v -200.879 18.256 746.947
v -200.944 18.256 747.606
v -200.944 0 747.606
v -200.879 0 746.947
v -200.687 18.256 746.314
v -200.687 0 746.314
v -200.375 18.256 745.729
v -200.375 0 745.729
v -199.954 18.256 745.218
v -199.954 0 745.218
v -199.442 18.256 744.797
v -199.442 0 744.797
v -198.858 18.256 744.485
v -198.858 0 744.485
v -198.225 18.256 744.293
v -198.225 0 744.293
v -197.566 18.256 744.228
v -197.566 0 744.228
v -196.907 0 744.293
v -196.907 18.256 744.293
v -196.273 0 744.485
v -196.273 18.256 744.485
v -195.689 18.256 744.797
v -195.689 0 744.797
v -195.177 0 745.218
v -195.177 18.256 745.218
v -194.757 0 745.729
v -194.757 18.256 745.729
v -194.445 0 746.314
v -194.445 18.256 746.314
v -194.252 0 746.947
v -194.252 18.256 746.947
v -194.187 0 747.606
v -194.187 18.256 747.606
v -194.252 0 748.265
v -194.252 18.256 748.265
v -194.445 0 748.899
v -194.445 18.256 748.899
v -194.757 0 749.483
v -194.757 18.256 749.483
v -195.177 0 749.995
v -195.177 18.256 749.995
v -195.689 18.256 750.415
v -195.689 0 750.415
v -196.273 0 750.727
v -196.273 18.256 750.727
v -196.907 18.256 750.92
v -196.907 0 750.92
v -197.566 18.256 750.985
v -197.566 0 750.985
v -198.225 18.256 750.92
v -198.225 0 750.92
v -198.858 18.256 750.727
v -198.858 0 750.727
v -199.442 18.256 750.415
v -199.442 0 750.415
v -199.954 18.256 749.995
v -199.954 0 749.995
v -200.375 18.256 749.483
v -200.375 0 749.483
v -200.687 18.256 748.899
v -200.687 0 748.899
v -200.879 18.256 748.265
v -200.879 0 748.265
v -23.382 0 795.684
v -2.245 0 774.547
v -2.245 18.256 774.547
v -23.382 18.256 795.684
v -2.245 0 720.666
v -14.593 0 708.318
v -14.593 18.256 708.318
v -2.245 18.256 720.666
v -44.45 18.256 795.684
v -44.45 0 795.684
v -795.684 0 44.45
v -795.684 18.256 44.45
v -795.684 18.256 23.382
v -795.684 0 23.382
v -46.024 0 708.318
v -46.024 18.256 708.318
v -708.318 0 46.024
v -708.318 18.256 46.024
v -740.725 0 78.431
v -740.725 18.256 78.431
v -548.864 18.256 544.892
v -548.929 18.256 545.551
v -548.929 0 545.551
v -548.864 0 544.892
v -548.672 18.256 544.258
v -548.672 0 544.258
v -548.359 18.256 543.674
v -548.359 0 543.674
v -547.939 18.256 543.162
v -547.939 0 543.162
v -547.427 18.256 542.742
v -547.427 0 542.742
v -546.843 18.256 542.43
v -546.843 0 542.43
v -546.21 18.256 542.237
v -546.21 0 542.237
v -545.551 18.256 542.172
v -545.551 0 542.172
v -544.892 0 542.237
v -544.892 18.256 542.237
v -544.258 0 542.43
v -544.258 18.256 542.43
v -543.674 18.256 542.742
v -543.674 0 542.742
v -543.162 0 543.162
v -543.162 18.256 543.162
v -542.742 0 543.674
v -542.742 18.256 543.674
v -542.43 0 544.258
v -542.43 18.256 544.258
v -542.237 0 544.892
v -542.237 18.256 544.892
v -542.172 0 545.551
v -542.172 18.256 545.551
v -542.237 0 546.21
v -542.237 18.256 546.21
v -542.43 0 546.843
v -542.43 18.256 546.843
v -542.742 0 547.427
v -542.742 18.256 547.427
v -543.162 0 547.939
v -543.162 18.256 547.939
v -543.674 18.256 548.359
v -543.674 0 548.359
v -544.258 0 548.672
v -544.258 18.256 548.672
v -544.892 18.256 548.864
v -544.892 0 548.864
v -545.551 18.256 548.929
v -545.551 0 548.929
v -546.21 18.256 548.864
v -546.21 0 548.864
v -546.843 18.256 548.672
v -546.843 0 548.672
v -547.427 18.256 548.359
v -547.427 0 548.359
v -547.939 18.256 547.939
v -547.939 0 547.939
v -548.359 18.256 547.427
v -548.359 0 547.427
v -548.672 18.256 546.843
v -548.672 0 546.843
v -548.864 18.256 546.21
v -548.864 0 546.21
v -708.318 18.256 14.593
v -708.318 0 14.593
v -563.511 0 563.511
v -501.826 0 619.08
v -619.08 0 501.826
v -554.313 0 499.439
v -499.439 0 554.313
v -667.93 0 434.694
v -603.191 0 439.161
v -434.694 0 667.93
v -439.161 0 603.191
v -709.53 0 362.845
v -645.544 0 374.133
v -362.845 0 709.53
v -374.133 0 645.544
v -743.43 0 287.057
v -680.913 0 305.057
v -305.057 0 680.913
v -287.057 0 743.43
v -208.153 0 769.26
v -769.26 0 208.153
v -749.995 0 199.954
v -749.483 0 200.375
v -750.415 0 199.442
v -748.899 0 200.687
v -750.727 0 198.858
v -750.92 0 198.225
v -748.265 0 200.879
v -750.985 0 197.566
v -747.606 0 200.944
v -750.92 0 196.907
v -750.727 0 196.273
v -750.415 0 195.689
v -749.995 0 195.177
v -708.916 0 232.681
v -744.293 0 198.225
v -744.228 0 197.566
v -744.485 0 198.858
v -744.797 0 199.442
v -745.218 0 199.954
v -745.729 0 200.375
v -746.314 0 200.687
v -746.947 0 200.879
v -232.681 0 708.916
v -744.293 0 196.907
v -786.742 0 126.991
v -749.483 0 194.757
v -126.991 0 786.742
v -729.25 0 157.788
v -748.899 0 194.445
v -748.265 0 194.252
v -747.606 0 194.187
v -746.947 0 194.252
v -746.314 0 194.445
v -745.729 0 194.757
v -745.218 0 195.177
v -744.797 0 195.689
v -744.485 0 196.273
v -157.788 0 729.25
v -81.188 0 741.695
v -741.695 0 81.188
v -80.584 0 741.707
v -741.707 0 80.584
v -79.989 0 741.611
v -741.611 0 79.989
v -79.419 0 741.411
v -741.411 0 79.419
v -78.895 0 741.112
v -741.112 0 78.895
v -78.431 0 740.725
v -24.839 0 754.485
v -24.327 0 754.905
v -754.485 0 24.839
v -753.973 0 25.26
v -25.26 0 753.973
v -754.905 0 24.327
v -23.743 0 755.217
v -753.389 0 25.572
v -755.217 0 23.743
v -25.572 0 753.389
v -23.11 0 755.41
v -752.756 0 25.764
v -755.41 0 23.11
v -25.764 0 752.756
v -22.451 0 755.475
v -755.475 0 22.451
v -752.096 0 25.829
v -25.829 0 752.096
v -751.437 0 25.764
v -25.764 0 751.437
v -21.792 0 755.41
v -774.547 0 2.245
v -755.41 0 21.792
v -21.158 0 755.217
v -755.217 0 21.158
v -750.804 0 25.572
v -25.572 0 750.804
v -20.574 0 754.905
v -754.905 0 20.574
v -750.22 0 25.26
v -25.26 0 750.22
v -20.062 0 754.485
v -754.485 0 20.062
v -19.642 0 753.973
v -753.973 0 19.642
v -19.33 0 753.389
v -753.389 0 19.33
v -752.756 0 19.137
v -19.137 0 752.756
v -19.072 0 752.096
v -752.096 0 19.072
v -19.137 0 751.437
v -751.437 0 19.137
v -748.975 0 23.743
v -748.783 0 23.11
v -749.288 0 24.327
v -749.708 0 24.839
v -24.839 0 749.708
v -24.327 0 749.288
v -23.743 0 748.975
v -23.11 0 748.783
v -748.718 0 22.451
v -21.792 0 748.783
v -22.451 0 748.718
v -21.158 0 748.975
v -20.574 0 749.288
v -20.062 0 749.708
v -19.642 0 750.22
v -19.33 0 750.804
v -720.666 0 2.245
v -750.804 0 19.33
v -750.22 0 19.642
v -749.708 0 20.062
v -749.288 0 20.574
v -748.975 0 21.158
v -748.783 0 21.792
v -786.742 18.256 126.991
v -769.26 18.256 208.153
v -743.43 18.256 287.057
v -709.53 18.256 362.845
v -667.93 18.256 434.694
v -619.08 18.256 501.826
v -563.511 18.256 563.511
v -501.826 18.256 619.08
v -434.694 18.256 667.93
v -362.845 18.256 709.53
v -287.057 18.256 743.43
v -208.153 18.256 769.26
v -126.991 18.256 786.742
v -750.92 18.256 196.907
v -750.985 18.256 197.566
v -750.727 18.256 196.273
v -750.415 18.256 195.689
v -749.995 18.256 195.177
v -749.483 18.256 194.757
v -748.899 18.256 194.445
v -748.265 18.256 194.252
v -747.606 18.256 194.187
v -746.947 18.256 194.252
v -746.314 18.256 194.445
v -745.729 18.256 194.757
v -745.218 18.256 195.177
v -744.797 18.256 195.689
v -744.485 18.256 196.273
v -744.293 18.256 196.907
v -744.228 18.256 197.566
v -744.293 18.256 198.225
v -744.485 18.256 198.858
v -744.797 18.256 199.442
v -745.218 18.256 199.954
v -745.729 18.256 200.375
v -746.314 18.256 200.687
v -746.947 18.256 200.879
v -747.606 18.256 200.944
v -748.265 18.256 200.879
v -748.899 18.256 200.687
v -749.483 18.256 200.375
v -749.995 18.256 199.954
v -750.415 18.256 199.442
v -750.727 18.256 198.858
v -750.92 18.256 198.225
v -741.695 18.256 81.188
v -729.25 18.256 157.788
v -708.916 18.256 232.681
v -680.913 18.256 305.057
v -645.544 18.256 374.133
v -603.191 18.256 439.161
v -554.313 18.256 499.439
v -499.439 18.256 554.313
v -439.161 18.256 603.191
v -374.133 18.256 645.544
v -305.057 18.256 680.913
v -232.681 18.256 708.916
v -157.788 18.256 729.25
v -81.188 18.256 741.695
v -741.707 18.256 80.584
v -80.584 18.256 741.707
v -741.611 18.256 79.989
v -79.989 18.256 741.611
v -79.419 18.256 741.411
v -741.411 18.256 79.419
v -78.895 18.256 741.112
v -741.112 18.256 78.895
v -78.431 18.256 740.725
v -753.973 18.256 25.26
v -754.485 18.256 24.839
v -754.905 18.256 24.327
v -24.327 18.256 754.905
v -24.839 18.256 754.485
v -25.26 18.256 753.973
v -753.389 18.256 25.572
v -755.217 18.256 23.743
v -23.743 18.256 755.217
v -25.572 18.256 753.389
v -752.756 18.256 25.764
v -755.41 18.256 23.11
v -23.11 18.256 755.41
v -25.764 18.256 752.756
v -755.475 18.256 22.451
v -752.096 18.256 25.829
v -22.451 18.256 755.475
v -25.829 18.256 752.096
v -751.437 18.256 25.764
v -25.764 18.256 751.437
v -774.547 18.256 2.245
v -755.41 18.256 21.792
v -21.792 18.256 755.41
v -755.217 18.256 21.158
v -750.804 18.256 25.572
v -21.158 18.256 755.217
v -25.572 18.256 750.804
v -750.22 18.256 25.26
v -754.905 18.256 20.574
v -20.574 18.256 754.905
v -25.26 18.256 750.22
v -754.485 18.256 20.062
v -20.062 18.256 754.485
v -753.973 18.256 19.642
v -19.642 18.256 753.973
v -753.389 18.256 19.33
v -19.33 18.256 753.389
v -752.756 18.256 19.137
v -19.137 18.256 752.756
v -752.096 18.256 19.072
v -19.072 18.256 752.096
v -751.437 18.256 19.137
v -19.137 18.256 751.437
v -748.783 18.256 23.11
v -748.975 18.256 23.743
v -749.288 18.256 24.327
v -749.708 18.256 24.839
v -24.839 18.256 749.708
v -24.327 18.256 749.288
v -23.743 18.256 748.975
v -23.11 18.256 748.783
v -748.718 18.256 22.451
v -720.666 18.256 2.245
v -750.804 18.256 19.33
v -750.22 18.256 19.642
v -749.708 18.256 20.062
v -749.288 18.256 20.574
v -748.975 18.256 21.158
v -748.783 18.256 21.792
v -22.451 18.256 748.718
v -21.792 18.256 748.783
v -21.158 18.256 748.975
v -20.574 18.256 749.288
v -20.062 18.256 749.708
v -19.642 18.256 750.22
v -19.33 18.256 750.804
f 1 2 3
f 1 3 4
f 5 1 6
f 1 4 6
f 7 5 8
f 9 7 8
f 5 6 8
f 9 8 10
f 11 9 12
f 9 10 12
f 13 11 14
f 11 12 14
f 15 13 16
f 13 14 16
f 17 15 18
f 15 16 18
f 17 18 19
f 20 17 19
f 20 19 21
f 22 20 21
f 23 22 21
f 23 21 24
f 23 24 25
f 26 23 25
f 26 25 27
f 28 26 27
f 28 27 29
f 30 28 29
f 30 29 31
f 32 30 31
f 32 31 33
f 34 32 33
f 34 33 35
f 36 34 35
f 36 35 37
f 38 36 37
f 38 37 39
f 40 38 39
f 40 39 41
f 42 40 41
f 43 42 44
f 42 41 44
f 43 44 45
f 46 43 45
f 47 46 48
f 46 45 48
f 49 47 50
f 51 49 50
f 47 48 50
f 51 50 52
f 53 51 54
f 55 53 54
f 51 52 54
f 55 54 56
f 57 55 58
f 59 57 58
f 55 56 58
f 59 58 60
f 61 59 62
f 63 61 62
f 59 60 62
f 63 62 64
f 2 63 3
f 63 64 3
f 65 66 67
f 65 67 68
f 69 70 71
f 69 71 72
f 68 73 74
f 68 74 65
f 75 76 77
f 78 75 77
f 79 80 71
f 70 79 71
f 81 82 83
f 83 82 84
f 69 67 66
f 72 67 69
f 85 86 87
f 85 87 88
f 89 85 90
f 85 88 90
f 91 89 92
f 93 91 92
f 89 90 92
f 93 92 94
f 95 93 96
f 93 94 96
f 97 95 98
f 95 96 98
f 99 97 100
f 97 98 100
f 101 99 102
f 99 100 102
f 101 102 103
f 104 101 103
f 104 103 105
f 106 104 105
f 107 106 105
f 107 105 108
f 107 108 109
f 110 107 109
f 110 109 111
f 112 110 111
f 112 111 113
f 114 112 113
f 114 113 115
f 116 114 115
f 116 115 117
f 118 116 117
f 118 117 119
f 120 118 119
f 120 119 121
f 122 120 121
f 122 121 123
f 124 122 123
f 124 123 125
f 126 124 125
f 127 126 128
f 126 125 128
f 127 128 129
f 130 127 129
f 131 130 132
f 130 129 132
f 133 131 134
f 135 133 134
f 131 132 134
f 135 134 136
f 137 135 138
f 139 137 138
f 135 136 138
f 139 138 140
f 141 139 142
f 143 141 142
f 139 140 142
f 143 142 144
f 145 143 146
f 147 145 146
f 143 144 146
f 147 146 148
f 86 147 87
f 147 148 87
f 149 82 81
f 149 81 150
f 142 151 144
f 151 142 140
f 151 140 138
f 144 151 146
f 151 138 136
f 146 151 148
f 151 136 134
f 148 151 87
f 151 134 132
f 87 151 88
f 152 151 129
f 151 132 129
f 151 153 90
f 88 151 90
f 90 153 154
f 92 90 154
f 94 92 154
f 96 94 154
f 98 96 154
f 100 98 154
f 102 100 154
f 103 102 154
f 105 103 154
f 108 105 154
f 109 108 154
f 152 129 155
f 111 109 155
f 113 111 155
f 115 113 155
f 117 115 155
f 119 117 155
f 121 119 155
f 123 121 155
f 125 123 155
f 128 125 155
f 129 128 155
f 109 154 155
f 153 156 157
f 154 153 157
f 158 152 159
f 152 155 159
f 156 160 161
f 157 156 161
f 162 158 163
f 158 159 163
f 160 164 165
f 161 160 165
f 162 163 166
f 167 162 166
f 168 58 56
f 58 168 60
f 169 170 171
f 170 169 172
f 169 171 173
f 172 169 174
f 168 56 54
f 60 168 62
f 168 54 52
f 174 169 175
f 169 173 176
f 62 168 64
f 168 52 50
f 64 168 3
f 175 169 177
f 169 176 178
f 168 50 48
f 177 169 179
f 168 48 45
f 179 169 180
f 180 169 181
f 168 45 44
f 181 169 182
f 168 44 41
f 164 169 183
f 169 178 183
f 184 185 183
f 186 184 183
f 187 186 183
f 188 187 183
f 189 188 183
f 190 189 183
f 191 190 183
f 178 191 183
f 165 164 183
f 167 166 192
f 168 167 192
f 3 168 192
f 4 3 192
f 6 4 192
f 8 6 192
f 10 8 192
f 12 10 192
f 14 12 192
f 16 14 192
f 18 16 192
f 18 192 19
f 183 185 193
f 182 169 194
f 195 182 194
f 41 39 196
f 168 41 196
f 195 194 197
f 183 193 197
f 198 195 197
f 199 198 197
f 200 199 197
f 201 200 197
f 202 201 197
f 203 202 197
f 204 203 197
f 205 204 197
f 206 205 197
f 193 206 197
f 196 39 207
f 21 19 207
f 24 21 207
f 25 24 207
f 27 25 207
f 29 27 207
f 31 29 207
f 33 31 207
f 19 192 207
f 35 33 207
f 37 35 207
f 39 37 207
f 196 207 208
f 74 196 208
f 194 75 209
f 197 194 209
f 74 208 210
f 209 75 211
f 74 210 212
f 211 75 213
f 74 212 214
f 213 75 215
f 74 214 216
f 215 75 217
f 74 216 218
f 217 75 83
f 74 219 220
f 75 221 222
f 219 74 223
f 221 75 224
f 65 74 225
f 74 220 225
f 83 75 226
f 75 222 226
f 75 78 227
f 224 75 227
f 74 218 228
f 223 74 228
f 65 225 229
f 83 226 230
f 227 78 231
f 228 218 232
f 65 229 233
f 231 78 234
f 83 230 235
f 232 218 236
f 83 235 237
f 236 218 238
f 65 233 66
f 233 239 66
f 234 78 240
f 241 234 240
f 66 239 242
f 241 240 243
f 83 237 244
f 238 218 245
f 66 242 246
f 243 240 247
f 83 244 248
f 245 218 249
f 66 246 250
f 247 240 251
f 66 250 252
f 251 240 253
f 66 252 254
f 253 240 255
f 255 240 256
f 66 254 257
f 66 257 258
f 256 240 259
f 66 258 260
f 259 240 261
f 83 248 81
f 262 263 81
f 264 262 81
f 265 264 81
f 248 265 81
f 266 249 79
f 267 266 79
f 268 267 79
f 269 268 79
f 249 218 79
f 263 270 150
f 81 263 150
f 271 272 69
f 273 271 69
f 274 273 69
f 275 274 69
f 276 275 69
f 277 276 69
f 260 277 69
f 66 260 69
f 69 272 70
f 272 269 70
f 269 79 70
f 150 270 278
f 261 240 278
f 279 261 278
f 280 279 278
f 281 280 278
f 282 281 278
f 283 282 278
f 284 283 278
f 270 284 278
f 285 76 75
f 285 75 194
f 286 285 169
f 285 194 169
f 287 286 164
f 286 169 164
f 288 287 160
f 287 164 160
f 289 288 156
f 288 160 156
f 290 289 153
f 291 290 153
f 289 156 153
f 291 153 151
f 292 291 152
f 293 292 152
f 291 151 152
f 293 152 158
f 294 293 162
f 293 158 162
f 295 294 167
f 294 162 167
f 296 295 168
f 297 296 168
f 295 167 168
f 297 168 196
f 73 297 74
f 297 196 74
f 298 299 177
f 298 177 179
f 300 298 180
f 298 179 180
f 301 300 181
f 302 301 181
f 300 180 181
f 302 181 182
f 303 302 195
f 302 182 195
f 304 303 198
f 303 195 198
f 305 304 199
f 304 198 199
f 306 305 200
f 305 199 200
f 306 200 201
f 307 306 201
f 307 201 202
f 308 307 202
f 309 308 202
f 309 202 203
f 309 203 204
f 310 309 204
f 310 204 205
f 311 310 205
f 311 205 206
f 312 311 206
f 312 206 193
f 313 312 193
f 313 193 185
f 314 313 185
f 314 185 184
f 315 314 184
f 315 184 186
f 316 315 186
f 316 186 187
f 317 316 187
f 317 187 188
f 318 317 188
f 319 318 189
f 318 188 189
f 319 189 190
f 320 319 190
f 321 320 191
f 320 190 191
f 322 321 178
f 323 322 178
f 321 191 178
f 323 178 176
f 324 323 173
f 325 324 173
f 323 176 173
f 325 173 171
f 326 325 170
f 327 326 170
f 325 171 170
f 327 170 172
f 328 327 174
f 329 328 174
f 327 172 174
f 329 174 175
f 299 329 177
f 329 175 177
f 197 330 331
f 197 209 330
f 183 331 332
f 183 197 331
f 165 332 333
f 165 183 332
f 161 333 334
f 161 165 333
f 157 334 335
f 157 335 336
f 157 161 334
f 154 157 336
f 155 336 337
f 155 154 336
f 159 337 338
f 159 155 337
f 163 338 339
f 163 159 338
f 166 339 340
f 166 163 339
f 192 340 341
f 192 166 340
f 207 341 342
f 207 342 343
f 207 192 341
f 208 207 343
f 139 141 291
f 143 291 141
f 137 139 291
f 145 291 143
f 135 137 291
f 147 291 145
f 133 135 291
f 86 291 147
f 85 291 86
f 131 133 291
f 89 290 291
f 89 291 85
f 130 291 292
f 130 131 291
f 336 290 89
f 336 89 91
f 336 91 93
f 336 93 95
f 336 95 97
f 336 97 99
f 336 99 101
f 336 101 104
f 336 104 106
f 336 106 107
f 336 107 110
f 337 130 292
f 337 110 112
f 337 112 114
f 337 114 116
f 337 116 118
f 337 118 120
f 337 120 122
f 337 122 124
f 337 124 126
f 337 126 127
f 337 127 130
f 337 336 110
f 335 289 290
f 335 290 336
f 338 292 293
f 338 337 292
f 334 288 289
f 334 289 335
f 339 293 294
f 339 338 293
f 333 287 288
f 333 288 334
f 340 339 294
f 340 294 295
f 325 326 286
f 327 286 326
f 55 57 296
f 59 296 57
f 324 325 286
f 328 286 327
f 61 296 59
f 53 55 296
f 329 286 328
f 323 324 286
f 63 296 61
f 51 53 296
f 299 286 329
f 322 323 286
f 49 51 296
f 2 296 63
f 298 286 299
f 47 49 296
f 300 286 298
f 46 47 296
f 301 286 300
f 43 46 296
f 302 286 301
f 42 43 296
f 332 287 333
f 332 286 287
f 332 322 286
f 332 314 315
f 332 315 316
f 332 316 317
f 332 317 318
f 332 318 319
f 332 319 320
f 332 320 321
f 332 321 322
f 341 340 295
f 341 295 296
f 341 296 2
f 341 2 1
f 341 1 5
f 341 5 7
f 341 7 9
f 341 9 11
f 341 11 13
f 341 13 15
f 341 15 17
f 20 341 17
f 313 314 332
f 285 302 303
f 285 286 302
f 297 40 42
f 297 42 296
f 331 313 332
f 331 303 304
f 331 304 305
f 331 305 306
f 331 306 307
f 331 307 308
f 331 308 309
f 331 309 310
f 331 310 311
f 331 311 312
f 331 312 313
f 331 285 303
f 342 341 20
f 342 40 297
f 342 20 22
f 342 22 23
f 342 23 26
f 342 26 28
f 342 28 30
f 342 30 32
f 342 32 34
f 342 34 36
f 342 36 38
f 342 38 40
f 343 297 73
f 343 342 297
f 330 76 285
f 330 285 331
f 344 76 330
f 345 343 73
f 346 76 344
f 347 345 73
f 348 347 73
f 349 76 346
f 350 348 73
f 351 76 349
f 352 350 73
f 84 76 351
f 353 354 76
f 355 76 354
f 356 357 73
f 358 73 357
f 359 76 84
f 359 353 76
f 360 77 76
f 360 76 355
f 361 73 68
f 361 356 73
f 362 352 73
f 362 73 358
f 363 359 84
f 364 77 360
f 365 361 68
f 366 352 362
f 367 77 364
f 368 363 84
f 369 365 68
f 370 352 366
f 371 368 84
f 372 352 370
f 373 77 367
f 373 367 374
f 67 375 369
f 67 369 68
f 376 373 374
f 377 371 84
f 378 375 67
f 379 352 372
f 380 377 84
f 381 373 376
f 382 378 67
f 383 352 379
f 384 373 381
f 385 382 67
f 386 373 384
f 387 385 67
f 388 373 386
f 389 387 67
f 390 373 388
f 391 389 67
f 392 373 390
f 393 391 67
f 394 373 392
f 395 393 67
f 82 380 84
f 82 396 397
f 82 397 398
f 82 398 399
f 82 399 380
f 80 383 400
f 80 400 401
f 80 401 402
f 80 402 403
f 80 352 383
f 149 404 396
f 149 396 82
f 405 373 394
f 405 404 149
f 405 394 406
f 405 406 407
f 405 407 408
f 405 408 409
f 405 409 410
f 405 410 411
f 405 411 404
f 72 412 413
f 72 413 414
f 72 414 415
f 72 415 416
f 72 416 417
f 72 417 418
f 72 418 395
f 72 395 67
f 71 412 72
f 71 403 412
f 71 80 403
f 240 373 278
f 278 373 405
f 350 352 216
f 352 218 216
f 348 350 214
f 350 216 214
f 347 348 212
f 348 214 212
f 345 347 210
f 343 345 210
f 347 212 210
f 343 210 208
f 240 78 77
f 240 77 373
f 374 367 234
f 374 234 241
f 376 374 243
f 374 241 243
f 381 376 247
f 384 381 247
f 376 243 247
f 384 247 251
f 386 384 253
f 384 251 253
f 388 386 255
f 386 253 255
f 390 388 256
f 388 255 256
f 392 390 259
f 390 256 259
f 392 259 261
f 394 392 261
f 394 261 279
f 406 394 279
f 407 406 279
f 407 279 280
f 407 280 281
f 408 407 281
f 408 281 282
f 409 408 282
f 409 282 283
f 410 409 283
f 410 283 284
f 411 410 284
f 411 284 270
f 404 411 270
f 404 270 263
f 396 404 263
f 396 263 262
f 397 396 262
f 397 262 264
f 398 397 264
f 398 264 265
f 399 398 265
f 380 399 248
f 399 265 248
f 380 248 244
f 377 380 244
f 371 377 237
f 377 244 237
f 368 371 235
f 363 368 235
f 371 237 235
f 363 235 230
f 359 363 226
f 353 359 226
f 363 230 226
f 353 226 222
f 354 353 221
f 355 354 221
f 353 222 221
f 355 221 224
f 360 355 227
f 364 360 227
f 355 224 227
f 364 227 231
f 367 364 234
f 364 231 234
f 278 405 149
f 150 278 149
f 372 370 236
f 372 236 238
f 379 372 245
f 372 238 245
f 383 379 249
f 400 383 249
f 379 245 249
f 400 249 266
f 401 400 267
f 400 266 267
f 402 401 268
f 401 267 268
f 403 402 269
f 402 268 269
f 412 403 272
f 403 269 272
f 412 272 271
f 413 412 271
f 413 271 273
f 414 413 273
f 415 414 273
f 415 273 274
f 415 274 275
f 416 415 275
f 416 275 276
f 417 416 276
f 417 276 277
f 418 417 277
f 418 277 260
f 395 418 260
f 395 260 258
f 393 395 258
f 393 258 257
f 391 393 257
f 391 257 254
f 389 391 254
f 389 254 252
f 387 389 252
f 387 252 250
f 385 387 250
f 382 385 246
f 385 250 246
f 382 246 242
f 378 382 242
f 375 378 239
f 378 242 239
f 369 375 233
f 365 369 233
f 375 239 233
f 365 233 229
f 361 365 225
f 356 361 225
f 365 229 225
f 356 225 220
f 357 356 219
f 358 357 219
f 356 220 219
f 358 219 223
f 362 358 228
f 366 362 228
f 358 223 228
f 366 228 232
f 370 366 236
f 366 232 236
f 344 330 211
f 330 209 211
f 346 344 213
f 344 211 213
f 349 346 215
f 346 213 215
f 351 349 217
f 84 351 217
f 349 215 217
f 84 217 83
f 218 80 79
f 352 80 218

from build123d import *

# Parameters (mm, degrees)
SKETCH1_R               = 796.925
SKETCH1_R_2             = 746.125
BOSS_EXTRUDE1_DEPTH     = 18.25625
CUT_EXTRUDE2_DEPTH      = 1128.169996901
SKETCH4_W               = 88.9
SKETCH4_H               = 44.45
SKETCH4_W_2             = 44.45
SKETCH4_H_2             = 88.9
BOSS_EXTRUDE2_DEPTH     = 18.25625
SKETCH10_W              = 88.9
SKETCH10_H              = 1.5875
SKETCH10_W_2            = 1.5875
SKETCH10_H_2            = 88.9
CUT_EXTRUDE3_DEPTH      = 1128.169996901
SKETCH11_W              = 1.240607087
SKETCH11_H              = 42.8625
SKETCH11_W_2            = 42.8625
SKETCH11_H_2            = 1.240607087
CUT_EXTRUDE4_DEPTH      = 1128.169996901
BOSS_EXTRUDE4_DEPTH     = 18.25625
CUT_EXTRUDE5_DEPTH      = 1126.415744032
F_1_4_CLEARANCE_HOLE3_D = 6.7564
F_1_4_CLEARANCE_HOLE1_D = 6.7564
CUT_EXTRUDE6_DEPTH      = 1126.415744032
FILLET4_R               = 3.3782


with BuildPart() as part:
    # Sketch1 → Boss-Extrude1 (new body)
    with BuildSketch(Plane(origin=(0, 0, 0), x_dir=(1, 0, 0), z_dir=(0, 1, 0))):
        with Locations(Location((0, 0, 0), (0, 0, 270))):
            Circle(SKETCH1_R)
        with Locations(Location((0, 0, 0), (0, 0, 270))):
            Circle(SKETCH1_R_2, mode=Mode.SUBTRACT)
    extrude(amount=BOSS_EXTRUDE1_DEPTH)

    # Sketch3 → Cut-Extrude2 (cut, through all)
    with BuildSketch(Plane(origin=(0, 18.25625, 0), x_dir=(1, 0, 0), z_dir=(0, 1, 0))):
        with BuildLine():
            Line((-796.925, 0), (0, 0))
            Line((0, 0), (0, -796.925))
            ThreePointArc((0, -796.925), (563.511071597, 563.511071597), (-796.925, 0))
        make_face()
    extrude(amount=-CUT_EXTRUDE2_DEPTH, mode=Mode.SUBTRACT)

    # Sketch4 → Boss-Extrude2 (add)
    with BuildSketch(Plane(origin=(0, 18.25625, 0), x_dir=(1, 0, 0), z_dir=(0, 1, 0))):
        with Locations((-752.475, -22.225)):
            Rectangle(SKETCH4_W, SKETCH4_H)
        with Locations((-22.225, -752.475)):
            Rectangle(SKETCH4_W_2, SKETCH4_H_2)
    extrude(amount=-BOSS_EXTRUDE2_DEPTH)

    # Sketch10 → Cut-Extrude3 (cut, through all)
    with BuildSketch(Plane(origin=(0, 18.25625, 0), x_dir=(1, 0, 0), z_dir=(0, 1, 0))):
        with Locations((-752.475, -0.79375)):
            Rectangle(SKETCH10_W, SKETCH10_H)
        with Locations((-0.79375, -752.475)):
            Rectangle(SKETCH10_W_2, SKETCH10_H_2)
    extrude(amount=-CUT_EXTRUDE3_DEPTH, mode=Mode.SUBTRACT)

    # Sketch11 → Cut-Extrude4 (cut, through all)
    with BuildSketch(Plane(origin=(0, 18.25625, 0), x_dir=(1, 0, 0), z_dir=(0, 1, 0))):
        with Locations((-796.304696457, -23.01875)):
            Rectangle(SKETCH11_W, SKETCH11_H)
        with Locations((-23.01875, -796.304696457)):
            Rectangle(SKETCH11_W_2, SKETCH11_H_2)
    extrude(amount=-CUT_EXTRUDE4_DEPTH, mode=Mode.SUBTRACT)

    # Sketch12 → Boss-Extrude4 (add, through all)
    with BuildSketch(Plane(origin=(0, 18.25625, 0), x_dir=(1, 0, 0), z_dir=(0, 1, 0))):
        with BuildLine():
            Line((-45.731111071, -708.025), (-79.575539683, -741.869428612))
            ThreePointArc((-79.575539683, -741.869428612), (-62.030076286, -743.542053458), (-44.45, -744.799780562))
            Line((-44.45, -744.799780562), (-44.45, -708.025))
            Line((-44.45, -708.025), (-45.731111071, -708.025))
        make_face()
        with BuildLine():
            Line((-708.025, -45.731111071), (-741.869428612, -79.575539683))
            ThreePointArc((-741.869428612, -79.575539683), (-743.542053458, -62.030076286), (-744.799780562, -44.45))
            Line((-744.799780562, -44.45), (-708.025, -44.45))
            Line((-708.025, -44.45), (-708.025, -45.731111071))
        make_face()
    extrude(amount=-BOSS_EXTRUDE4_DEPTH)

    # Sketch14 → Cut-Extrude5 (cut, through all)
    with BuildSketch(Plane.XZ):
        Polygon((-166.462625141, 960.559518053), (42.242196456, 751.854696456), (-751.854696456, -42.242196456), (-960.559518053, 166.462625141), (-949.662084803, 177.360058391), (-747.606322079, -24.695704333), (24.695704333, 747.606322079), (-177.360058391, 949.662084803), align=None)
    extrude(amount=-CUT_EXTRUDE5_DEPTH, mode=Mode.SUBTRACT)

    # 1/4 Clearance Hole3 (through all)
    with Locations(Plane(origin=(0, 18.25625, 0), x_dir=(1, 0, 0), z_dir=(0, 1, 0))):
        with Locations((-752.09645014, -22.450640303), (-22.450640303, -752.09645014)):
            Hole(F_1_4_CLEARANCE_HOLE3_D / 2)

    # 1/4 Clearance Hole1 (through all)
    with Locations(Plane(origin=(0, 18.25625, 0), x_dir=(1, 0, 0), z_dir=(0, 1, 0))):
        with Locations((-747.606322079, -197.565634664), (-545.550559355, -545.550559355), (-197.565634664, -747.606322079)):
            Hole(F_1_4_CLEARANCE_HOLE1_D / 2)

    # Sketch19 → Cut-Extrude6 (cut, through all)
    with BuildSketch(Plane(origin=(0, 18.25625, 0), x_dir=(1, 0, 0), z_dir=(0, 1, 0))):
        Polygon((-774.547090442, -2.24506403), (-720.665553716, -2.24506403), (-747.606322079, 24.695704333), align=None)
        Polygon((-708.317701549, -14.592916197), (-708.025, -14.885617746), (-708.025, -45.731111071), (-708.317701549, -46.02381262), align=None)
        Polygon((-14.885617746, -708.025), (-45.731111071, -708.025), (-46.02381262, -708.317701549), (-14.592916197, -708.317701549), align=None)
        Polygon((24.695704333, -747.606322079), (-2.24506403, -774.547090442), (-2.24506403, -720.665553716), align=None)
    extrude(amount=-CUT_EXTRUDE6_DEPTH, mode=Mode.SUBTRACT)

    # Fillet4
    fillet4_edges = [part.edges().sort_by_distance(p)[0] for p in [
        (-79.575539683, 9.128125, 741.869428612),
        (-741.869428612, 9.128125, 79.575539683),
    ]]
    fillet(fillet4_edges, radius=FILLET4_R)


solid = part.part
